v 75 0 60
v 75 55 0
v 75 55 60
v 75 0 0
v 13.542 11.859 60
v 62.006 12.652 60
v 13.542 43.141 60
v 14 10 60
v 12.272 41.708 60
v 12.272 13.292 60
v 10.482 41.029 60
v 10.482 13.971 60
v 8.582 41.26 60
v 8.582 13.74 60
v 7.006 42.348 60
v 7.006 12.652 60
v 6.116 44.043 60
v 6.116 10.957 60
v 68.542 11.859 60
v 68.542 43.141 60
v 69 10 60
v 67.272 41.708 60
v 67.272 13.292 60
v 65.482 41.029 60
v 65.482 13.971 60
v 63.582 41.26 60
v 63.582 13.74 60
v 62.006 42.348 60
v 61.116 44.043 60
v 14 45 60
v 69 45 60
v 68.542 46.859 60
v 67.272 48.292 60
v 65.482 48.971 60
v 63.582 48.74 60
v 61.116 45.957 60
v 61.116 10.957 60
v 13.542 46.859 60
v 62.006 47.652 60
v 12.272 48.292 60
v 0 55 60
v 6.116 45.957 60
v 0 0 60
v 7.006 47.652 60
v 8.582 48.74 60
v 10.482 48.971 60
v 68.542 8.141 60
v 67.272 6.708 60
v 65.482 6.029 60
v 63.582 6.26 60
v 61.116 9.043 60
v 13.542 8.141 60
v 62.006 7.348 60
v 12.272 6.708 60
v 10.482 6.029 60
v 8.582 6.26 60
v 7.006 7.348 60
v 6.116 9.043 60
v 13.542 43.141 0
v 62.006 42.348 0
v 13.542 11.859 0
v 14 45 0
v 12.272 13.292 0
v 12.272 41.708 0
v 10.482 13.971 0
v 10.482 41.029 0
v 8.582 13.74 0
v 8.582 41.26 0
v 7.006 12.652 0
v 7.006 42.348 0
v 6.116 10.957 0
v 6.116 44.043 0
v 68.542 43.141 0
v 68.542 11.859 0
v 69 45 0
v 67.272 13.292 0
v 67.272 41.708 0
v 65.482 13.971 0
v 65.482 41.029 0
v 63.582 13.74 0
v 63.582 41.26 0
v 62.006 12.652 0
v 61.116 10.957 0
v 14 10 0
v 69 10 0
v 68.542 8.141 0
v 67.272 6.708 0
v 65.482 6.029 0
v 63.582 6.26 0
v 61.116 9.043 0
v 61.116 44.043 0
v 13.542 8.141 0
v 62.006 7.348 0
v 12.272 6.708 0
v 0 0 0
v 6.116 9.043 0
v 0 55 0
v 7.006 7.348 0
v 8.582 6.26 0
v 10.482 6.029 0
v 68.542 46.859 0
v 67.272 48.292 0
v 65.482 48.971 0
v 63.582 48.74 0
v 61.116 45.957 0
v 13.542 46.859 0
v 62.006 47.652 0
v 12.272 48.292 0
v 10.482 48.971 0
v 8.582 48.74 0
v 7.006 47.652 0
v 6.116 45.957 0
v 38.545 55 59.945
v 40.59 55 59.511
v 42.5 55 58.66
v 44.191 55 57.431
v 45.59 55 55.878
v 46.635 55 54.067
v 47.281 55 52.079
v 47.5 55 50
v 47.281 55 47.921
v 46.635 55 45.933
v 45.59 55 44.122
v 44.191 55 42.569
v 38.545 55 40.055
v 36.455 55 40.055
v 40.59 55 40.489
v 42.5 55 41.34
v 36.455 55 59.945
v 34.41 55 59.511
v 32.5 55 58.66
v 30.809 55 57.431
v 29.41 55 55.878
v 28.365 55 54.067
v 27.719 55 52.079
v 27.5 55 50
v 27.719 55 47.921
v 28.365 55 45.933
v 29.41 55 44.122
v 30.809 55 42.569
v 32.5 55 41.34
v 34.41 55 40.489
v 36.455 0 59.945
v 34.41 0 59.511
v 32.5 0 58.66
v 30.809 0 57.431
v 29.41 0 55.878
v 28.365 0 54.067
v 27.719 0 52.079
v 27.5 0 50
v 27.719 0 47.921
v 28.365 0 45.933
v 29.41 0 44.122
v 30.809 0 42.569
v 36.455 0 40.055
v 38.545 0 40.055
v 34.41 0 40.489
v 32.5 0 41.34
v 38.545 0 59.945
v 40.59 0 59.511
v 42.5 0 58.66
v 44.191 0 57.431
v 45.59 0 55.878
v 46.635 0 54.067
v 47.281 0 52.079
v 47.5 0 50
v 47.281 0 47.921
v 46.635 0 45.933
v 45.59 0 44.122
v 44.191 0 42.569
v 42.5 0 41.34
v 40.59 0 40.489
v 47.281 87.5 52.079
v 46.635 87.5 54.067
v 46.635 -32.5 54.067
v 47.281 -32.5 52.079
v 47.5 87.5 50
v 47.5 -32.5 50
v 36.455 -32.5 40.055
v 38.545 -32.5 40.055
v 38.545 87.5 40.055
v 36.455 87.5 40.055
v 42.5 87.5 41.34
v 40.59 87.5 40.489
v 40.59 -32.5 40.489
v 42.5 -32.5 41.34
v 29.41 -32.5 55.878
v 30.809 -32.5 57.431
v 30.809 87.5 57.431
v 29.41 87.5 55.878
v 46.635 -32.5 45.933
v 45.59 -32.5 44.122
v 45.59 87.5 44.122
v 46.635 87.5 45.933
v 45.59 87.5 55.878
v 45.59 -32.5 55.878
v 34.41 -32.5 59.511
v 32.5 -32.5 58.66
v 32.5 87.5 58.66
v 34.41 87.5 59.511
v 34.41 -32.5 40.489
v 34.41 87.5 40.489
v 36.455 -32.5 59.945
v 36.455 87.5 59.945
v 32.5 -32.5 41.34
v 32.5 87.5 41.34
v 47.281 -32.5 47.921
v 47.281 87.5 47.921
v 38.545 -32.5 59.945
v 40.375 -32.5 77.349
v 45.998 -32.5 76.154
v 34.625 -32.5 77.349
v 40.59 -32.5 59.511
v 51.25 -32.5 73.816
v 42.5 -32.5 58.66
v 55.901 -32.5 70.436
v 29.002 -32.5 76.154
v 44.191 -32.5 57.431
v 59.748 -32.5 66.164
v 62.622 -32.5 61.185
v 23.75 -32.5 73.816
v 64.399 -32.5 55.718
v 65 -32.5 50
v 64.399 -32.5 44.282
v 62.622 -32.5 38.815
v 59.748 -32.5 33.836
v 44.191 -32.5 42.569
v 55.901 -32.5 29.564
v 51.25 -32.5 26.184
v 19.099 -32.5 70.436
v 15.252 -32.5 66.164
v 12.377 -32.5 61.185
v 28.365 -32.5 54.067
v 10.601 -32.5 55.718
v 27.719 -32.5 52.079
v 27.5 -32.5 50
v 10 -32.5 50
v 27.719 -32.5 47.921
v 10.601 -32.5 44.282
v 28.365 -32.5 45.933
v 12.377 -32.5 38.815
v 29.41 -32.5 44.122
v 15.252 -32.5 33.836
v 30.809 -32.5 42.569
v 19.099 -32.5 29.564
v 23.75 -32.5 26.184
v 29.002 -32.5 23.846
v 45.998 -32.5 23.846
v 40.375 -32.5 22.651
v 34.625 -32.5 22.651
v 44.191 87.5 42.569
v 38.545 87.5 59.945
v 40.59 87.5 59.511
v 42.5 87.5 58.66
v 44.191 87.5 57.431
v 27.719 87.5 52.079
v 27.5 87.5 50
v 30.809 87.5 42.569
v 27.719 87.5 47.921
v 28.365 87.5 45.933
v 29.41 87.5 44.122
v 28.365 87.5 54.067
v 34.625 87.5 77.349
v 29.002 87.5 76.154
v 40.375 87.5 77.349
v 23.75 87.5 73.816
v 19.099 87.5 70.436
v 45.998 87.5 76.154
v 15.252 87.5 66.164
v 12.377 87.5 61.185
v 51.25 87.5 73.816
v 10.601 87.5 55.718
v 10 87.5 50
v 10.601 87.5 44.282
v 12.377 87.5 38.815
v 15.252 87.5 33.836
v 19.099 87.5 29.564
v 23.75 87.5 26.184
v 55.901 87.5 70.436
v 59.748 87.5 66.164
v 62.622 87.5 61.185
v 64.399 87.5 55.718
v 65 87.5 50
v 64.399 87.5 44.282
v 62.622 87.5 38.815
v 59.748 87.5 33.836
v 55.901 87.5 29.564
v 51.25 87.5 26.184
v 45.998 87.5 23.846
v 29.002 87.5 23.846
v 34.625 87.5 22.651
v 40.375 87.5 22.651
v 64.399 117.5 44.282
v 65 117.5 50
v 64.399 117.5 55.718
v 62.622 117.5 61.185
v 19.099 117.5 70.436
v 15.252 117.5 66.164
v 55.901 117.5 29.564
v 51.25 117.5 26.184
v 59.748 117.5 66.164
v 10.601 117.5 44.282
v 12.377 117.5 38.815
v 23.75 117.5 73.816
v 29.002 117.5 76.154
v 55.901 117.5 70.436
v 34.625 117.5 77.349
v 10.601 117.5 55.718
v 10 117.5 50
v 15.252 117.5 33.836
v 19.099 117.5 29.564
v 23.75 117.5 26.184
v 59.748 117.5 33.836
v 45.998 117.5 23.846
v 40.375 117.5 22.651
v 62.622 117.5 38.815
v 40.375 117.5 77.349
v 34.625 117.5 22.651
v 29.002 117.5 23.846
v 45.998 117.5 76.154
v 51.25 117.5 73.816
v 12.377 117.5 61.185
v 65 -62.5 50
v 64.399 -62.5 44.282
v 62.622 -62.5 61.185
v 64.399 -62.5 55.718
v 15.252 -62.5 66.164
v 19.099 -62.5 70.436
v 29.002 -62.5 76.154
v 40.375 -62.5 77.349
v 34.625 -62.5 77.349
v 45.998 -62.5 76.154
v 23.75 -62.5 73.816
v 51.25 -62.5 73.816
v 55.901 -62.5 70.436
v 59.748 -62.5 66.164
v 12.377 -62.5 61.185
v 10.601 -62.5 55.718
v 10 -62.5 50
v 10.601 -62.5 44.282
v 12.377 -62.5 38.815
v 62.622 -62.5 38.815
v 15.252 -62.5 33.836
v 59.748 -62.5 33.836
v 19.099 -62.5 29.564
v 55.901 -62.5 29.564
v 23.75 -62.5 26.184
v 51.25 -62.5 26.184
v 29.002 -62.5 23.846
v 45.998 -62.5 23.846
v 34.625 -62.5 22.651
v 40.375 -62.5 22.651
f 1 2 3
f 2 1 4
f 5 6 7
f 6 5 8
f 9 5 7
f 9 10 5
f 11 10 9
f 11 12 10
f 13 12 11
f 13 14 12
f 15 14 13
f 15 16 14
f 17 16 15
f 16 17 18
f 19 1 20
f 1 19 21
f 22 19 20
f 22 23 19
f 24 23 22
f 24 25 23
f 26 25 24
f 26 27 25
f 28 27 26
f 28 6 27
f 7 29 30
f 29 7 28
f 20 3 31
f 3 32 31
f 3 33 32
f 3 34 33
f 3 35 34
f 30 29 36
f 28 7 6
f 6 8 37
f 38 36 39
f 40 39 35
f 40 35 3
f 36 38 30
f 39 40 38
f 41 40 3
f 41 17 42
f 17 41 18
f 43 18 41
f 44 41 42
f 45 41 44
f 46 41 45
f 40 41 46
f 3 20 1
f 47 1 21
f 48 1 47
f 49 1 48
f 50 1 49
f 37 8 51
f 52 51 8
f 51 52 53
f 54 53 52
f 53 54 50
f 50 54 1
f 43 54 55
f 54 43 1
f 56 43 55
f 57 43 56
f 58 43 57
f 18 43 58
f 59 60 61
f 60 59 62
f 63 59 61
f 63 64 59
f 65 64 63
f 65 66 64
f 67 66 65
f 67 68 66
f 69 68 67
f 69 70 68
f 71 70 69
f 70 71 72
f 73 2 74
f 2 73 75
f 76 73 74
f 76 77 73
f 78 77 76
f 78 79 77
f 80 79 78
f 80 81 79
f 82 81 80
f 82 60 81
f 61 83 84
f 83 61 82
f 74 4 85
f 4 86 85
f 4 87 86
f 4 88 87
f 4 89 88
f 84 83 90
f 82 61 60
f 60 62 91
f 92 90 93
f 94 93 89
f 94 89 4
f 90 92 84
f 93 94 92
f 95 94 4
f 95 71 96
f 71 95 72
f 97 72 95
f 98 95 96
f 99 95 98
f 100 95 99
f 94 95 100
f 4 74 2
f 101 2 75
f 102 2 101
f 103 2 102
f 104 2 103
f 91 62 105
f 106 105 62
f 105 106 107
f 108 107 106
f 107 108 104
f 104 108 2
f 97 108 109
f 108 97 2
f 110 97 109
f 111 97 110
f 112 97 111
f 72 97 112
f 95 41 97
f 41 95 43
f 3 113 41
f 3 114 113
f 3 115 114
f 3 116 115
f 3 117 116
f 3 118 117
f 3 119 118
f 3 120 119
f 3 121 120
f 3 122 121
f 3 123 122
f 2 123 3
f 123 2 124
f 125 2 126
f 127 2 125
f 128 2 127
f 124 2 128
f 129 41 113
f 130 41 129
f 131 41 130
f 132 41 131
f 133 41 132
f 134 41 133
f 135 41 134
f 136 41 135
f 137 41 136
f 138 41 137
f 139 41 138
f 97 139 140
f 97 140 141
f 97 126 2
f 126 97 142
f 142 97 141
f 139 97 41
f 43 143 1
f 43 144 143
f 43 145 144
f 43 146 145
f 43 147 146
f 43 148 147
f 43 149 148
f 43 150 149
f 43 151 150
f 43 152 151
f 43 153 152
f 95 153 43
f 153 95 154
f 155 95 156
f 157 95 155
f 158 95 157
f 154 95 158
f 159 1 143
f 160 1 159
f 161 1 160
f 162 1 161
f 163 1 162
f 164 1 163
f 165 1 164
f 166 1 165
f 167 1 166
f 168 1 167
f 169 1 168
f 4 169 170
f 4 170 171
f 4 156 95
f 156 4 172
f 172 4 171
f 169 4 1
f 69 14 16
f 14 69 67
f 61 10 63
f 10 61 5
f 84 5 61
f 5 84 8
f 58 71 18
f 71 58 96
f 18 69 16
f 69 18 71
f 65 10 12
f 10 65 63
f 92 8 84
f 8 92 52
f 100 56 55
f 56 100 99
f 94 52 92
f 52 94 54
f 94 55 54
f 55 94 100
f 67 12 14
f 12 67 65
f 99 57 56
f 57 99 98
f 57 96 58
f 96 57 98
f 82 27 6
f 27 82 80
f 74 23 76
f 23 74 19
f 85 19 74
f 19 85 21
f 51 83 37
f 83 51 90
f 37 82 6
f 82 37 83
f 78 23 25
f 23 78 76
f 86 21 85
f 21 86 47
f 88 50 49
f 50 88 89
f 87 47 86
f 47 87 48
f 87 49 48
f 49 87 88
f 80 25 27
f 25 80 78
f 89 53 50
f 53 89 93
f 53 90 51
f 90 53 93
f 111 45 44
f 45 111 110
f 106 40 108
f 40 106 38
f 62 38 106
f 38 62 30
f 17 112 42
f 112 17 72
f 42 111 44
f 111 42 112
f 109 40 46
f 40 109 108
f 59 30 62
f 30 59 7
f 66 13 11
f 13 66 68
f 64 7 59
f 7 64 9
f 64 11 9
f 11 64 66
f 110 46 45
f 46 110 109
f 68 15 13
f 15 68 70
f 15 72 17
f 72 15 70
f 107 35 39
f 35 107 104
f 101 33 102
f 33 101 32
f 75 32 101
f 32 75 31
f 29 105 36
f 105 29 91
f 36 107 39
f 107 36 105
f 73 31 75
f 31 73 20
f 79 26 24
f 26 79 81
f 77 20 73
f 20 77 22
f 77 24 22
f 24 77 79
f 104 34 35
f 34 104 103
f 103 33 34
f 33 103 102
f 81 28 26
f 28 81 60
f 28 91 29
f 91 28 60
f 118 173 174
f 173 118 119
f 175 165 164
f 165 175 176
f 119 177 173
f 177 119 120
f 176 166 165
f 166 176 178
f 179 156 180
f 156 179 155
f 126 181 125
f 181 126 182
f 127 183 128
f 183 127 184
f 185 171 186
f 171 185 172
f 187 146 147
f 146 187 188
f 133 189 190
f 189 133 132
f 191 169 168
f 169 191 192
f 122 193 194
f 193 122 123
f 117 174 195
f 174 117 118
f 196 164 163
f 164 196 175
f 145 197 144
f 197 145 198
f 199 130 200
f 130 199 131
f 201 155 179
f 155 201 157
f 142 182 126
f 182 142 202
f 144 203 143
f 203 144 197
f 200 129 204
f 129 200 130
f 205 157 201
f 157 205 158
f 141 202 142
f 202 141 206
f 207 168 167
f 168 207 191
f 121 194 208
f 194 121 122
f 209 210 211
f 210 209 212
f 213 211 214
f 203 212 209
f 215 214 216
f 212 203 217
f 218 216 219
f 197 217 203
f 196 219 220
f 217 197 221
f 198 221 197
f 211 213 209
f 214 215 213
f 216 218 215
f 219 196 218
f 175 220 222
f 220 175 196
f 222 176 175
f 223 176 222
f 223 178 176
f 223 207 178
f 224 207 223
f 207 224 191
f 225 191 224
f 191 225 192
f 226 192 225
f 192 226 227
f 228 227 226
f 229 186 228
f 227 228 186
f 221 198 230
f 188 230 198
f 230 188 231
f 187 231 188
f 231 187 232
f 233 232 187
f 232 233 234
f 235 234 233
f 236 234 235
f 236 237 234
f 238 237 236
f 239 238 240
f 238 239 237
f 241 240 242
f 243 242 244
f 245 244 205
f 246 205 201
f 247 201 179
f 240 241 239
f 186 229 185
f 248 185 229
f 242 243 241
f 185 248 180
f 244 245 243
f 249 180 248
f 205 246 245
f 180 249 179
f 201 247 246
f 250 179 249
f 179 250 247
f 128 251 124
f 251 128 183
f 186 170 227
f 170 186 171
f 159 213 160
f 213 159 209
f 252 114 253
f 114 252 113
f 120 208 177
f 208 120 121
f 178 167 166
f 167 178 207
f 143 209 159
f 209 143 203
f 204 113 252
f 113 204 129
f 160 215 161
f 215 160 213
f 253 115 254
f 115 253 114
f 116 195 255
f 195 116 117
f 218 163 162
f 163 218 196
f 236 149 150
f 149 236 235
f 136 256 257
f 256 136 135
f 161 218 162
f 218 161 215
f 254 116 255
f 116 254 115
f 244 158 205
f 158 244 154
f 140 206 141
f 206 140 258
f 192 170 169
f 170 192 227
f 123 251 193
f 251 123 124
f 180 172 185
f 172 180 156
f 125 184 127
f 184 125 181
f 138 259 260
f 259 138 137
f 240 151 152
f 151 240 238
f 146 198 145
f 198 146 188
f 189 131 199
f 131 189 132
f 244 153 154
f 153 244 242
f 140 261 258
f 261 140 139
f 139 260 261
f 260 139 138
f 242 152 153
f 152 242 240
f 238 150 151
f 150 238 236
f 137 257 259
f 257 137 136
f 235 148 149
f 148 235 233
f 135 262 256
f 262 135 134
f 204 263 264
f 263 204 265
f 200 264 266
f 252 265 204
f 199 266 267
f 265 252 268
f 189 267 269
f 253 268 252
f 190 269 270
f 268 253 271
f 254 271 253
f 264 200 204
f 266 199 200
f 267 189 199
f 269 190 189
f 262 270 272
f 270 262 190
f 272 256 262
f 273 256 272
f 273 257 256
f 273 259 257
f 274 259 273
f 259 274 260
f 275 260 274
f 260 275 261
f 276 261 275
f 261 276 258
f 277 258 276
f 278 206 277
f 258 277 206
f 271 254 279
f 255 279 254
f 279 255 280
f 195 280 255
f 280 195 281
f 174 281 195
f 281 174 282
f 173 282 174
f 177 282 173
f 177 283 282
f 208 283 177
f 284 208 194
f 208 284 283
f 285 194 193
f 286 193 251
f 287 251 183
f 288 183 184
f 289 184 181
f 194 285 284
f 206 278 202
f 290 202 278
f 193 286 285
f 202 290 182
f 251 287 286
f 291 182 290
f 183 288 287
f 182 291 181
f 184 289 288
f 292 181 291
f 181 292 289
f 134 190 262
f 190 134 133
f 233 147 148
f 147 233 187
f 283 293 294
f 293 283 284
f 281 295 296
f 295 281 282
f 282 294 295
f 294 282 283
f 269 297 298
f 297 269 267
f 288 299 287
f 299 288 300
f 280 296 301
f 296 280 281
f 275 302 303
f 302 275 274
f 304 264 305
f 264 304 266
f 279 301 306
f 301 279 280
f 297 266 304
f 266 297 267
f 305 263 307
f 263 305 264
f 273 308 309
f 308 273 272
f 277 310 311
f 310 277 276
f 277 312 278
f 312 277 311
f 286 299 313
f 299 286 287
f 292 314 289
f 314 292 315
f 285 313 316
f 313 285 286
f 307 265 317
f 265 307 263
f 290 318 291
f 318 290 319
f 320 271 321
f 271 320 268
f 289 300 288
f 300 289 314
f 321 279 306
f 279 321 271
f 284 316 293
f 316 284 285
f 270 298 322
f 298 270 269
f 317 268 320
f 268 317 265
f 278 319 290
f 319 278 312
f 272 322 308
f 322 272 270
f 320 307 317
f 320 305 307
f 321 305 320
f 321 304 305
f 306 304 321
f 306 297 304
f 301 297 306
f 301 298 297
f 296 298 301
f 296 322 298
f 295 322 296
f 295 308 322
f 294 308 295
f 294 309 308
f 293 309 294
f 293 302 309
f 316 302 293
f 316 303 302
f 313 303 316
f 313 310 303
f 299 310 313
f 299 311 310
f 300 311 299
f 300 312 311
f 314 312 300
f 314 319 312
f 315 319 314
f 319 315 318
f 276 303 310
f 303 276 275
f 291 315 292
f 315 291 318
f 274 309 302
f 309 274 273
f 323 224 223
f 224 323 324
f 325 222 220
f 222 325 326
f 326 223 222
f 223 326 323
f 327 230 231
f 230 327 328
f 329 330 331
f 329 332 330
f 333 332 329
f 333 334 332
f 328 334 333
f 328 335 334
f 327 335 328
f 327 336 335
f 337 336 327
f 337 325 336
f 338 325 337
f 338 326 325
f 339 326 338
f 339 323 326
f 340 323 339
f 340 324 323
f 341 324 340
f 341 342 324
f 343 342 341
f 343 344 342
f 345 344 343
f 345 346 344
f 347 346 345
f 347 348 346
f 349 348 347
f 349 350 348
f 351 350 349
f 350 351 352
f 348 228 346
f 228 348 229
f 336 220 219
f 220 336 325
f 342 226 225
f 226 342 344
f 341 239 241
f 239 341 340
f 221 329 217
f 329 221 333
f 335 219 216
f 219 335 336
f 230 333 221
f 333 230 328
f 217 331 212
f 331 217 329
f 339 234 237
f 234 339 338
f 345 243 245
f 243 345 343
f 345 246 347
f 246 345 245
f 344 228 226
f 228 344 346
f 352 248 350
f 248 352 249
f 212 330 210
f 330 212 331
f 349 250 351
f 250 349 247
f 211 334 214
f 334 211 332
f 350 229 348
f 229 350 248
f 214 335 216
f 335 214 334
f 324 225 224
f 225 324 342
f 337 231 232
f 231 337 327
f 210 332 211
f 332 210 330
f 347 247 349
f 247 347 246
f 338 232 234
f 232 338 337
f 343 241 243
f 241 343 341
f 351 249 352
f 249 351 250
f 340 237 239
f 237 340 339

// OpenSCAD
difference() {
    cube(size = [75, 55, 60]);

    translate([10, 10, -1]) cylinder(h = 62, d = 8); 
    translate([75 - 10, 10, -1]) cylinder(h = 62, d = 8);
    translate([10, 55 - 10, -1]) cylinder(h = 62, d = 8);
    translate([75 - 10, 55 - 10, -1]) cylinder(h = 62, d = 8);
}

translate([75/2, 55/2, 60 - 20/2]) rotate([90, 0, 0]) cylinder(h = 120, d = 20, center = true);

translate([75/2, 55/2 + 120/2 + 30/2, 60 - 20/2]) rotate([90, 0, 0]) cylinder(h = 30, d = 55, center = true);

translate([75/2, 55/2 - 120/2 - 30/2, 60 - 20/2]) rotate([90, 0, 0]) cylinder(h = 30, d = 55, center = true);
